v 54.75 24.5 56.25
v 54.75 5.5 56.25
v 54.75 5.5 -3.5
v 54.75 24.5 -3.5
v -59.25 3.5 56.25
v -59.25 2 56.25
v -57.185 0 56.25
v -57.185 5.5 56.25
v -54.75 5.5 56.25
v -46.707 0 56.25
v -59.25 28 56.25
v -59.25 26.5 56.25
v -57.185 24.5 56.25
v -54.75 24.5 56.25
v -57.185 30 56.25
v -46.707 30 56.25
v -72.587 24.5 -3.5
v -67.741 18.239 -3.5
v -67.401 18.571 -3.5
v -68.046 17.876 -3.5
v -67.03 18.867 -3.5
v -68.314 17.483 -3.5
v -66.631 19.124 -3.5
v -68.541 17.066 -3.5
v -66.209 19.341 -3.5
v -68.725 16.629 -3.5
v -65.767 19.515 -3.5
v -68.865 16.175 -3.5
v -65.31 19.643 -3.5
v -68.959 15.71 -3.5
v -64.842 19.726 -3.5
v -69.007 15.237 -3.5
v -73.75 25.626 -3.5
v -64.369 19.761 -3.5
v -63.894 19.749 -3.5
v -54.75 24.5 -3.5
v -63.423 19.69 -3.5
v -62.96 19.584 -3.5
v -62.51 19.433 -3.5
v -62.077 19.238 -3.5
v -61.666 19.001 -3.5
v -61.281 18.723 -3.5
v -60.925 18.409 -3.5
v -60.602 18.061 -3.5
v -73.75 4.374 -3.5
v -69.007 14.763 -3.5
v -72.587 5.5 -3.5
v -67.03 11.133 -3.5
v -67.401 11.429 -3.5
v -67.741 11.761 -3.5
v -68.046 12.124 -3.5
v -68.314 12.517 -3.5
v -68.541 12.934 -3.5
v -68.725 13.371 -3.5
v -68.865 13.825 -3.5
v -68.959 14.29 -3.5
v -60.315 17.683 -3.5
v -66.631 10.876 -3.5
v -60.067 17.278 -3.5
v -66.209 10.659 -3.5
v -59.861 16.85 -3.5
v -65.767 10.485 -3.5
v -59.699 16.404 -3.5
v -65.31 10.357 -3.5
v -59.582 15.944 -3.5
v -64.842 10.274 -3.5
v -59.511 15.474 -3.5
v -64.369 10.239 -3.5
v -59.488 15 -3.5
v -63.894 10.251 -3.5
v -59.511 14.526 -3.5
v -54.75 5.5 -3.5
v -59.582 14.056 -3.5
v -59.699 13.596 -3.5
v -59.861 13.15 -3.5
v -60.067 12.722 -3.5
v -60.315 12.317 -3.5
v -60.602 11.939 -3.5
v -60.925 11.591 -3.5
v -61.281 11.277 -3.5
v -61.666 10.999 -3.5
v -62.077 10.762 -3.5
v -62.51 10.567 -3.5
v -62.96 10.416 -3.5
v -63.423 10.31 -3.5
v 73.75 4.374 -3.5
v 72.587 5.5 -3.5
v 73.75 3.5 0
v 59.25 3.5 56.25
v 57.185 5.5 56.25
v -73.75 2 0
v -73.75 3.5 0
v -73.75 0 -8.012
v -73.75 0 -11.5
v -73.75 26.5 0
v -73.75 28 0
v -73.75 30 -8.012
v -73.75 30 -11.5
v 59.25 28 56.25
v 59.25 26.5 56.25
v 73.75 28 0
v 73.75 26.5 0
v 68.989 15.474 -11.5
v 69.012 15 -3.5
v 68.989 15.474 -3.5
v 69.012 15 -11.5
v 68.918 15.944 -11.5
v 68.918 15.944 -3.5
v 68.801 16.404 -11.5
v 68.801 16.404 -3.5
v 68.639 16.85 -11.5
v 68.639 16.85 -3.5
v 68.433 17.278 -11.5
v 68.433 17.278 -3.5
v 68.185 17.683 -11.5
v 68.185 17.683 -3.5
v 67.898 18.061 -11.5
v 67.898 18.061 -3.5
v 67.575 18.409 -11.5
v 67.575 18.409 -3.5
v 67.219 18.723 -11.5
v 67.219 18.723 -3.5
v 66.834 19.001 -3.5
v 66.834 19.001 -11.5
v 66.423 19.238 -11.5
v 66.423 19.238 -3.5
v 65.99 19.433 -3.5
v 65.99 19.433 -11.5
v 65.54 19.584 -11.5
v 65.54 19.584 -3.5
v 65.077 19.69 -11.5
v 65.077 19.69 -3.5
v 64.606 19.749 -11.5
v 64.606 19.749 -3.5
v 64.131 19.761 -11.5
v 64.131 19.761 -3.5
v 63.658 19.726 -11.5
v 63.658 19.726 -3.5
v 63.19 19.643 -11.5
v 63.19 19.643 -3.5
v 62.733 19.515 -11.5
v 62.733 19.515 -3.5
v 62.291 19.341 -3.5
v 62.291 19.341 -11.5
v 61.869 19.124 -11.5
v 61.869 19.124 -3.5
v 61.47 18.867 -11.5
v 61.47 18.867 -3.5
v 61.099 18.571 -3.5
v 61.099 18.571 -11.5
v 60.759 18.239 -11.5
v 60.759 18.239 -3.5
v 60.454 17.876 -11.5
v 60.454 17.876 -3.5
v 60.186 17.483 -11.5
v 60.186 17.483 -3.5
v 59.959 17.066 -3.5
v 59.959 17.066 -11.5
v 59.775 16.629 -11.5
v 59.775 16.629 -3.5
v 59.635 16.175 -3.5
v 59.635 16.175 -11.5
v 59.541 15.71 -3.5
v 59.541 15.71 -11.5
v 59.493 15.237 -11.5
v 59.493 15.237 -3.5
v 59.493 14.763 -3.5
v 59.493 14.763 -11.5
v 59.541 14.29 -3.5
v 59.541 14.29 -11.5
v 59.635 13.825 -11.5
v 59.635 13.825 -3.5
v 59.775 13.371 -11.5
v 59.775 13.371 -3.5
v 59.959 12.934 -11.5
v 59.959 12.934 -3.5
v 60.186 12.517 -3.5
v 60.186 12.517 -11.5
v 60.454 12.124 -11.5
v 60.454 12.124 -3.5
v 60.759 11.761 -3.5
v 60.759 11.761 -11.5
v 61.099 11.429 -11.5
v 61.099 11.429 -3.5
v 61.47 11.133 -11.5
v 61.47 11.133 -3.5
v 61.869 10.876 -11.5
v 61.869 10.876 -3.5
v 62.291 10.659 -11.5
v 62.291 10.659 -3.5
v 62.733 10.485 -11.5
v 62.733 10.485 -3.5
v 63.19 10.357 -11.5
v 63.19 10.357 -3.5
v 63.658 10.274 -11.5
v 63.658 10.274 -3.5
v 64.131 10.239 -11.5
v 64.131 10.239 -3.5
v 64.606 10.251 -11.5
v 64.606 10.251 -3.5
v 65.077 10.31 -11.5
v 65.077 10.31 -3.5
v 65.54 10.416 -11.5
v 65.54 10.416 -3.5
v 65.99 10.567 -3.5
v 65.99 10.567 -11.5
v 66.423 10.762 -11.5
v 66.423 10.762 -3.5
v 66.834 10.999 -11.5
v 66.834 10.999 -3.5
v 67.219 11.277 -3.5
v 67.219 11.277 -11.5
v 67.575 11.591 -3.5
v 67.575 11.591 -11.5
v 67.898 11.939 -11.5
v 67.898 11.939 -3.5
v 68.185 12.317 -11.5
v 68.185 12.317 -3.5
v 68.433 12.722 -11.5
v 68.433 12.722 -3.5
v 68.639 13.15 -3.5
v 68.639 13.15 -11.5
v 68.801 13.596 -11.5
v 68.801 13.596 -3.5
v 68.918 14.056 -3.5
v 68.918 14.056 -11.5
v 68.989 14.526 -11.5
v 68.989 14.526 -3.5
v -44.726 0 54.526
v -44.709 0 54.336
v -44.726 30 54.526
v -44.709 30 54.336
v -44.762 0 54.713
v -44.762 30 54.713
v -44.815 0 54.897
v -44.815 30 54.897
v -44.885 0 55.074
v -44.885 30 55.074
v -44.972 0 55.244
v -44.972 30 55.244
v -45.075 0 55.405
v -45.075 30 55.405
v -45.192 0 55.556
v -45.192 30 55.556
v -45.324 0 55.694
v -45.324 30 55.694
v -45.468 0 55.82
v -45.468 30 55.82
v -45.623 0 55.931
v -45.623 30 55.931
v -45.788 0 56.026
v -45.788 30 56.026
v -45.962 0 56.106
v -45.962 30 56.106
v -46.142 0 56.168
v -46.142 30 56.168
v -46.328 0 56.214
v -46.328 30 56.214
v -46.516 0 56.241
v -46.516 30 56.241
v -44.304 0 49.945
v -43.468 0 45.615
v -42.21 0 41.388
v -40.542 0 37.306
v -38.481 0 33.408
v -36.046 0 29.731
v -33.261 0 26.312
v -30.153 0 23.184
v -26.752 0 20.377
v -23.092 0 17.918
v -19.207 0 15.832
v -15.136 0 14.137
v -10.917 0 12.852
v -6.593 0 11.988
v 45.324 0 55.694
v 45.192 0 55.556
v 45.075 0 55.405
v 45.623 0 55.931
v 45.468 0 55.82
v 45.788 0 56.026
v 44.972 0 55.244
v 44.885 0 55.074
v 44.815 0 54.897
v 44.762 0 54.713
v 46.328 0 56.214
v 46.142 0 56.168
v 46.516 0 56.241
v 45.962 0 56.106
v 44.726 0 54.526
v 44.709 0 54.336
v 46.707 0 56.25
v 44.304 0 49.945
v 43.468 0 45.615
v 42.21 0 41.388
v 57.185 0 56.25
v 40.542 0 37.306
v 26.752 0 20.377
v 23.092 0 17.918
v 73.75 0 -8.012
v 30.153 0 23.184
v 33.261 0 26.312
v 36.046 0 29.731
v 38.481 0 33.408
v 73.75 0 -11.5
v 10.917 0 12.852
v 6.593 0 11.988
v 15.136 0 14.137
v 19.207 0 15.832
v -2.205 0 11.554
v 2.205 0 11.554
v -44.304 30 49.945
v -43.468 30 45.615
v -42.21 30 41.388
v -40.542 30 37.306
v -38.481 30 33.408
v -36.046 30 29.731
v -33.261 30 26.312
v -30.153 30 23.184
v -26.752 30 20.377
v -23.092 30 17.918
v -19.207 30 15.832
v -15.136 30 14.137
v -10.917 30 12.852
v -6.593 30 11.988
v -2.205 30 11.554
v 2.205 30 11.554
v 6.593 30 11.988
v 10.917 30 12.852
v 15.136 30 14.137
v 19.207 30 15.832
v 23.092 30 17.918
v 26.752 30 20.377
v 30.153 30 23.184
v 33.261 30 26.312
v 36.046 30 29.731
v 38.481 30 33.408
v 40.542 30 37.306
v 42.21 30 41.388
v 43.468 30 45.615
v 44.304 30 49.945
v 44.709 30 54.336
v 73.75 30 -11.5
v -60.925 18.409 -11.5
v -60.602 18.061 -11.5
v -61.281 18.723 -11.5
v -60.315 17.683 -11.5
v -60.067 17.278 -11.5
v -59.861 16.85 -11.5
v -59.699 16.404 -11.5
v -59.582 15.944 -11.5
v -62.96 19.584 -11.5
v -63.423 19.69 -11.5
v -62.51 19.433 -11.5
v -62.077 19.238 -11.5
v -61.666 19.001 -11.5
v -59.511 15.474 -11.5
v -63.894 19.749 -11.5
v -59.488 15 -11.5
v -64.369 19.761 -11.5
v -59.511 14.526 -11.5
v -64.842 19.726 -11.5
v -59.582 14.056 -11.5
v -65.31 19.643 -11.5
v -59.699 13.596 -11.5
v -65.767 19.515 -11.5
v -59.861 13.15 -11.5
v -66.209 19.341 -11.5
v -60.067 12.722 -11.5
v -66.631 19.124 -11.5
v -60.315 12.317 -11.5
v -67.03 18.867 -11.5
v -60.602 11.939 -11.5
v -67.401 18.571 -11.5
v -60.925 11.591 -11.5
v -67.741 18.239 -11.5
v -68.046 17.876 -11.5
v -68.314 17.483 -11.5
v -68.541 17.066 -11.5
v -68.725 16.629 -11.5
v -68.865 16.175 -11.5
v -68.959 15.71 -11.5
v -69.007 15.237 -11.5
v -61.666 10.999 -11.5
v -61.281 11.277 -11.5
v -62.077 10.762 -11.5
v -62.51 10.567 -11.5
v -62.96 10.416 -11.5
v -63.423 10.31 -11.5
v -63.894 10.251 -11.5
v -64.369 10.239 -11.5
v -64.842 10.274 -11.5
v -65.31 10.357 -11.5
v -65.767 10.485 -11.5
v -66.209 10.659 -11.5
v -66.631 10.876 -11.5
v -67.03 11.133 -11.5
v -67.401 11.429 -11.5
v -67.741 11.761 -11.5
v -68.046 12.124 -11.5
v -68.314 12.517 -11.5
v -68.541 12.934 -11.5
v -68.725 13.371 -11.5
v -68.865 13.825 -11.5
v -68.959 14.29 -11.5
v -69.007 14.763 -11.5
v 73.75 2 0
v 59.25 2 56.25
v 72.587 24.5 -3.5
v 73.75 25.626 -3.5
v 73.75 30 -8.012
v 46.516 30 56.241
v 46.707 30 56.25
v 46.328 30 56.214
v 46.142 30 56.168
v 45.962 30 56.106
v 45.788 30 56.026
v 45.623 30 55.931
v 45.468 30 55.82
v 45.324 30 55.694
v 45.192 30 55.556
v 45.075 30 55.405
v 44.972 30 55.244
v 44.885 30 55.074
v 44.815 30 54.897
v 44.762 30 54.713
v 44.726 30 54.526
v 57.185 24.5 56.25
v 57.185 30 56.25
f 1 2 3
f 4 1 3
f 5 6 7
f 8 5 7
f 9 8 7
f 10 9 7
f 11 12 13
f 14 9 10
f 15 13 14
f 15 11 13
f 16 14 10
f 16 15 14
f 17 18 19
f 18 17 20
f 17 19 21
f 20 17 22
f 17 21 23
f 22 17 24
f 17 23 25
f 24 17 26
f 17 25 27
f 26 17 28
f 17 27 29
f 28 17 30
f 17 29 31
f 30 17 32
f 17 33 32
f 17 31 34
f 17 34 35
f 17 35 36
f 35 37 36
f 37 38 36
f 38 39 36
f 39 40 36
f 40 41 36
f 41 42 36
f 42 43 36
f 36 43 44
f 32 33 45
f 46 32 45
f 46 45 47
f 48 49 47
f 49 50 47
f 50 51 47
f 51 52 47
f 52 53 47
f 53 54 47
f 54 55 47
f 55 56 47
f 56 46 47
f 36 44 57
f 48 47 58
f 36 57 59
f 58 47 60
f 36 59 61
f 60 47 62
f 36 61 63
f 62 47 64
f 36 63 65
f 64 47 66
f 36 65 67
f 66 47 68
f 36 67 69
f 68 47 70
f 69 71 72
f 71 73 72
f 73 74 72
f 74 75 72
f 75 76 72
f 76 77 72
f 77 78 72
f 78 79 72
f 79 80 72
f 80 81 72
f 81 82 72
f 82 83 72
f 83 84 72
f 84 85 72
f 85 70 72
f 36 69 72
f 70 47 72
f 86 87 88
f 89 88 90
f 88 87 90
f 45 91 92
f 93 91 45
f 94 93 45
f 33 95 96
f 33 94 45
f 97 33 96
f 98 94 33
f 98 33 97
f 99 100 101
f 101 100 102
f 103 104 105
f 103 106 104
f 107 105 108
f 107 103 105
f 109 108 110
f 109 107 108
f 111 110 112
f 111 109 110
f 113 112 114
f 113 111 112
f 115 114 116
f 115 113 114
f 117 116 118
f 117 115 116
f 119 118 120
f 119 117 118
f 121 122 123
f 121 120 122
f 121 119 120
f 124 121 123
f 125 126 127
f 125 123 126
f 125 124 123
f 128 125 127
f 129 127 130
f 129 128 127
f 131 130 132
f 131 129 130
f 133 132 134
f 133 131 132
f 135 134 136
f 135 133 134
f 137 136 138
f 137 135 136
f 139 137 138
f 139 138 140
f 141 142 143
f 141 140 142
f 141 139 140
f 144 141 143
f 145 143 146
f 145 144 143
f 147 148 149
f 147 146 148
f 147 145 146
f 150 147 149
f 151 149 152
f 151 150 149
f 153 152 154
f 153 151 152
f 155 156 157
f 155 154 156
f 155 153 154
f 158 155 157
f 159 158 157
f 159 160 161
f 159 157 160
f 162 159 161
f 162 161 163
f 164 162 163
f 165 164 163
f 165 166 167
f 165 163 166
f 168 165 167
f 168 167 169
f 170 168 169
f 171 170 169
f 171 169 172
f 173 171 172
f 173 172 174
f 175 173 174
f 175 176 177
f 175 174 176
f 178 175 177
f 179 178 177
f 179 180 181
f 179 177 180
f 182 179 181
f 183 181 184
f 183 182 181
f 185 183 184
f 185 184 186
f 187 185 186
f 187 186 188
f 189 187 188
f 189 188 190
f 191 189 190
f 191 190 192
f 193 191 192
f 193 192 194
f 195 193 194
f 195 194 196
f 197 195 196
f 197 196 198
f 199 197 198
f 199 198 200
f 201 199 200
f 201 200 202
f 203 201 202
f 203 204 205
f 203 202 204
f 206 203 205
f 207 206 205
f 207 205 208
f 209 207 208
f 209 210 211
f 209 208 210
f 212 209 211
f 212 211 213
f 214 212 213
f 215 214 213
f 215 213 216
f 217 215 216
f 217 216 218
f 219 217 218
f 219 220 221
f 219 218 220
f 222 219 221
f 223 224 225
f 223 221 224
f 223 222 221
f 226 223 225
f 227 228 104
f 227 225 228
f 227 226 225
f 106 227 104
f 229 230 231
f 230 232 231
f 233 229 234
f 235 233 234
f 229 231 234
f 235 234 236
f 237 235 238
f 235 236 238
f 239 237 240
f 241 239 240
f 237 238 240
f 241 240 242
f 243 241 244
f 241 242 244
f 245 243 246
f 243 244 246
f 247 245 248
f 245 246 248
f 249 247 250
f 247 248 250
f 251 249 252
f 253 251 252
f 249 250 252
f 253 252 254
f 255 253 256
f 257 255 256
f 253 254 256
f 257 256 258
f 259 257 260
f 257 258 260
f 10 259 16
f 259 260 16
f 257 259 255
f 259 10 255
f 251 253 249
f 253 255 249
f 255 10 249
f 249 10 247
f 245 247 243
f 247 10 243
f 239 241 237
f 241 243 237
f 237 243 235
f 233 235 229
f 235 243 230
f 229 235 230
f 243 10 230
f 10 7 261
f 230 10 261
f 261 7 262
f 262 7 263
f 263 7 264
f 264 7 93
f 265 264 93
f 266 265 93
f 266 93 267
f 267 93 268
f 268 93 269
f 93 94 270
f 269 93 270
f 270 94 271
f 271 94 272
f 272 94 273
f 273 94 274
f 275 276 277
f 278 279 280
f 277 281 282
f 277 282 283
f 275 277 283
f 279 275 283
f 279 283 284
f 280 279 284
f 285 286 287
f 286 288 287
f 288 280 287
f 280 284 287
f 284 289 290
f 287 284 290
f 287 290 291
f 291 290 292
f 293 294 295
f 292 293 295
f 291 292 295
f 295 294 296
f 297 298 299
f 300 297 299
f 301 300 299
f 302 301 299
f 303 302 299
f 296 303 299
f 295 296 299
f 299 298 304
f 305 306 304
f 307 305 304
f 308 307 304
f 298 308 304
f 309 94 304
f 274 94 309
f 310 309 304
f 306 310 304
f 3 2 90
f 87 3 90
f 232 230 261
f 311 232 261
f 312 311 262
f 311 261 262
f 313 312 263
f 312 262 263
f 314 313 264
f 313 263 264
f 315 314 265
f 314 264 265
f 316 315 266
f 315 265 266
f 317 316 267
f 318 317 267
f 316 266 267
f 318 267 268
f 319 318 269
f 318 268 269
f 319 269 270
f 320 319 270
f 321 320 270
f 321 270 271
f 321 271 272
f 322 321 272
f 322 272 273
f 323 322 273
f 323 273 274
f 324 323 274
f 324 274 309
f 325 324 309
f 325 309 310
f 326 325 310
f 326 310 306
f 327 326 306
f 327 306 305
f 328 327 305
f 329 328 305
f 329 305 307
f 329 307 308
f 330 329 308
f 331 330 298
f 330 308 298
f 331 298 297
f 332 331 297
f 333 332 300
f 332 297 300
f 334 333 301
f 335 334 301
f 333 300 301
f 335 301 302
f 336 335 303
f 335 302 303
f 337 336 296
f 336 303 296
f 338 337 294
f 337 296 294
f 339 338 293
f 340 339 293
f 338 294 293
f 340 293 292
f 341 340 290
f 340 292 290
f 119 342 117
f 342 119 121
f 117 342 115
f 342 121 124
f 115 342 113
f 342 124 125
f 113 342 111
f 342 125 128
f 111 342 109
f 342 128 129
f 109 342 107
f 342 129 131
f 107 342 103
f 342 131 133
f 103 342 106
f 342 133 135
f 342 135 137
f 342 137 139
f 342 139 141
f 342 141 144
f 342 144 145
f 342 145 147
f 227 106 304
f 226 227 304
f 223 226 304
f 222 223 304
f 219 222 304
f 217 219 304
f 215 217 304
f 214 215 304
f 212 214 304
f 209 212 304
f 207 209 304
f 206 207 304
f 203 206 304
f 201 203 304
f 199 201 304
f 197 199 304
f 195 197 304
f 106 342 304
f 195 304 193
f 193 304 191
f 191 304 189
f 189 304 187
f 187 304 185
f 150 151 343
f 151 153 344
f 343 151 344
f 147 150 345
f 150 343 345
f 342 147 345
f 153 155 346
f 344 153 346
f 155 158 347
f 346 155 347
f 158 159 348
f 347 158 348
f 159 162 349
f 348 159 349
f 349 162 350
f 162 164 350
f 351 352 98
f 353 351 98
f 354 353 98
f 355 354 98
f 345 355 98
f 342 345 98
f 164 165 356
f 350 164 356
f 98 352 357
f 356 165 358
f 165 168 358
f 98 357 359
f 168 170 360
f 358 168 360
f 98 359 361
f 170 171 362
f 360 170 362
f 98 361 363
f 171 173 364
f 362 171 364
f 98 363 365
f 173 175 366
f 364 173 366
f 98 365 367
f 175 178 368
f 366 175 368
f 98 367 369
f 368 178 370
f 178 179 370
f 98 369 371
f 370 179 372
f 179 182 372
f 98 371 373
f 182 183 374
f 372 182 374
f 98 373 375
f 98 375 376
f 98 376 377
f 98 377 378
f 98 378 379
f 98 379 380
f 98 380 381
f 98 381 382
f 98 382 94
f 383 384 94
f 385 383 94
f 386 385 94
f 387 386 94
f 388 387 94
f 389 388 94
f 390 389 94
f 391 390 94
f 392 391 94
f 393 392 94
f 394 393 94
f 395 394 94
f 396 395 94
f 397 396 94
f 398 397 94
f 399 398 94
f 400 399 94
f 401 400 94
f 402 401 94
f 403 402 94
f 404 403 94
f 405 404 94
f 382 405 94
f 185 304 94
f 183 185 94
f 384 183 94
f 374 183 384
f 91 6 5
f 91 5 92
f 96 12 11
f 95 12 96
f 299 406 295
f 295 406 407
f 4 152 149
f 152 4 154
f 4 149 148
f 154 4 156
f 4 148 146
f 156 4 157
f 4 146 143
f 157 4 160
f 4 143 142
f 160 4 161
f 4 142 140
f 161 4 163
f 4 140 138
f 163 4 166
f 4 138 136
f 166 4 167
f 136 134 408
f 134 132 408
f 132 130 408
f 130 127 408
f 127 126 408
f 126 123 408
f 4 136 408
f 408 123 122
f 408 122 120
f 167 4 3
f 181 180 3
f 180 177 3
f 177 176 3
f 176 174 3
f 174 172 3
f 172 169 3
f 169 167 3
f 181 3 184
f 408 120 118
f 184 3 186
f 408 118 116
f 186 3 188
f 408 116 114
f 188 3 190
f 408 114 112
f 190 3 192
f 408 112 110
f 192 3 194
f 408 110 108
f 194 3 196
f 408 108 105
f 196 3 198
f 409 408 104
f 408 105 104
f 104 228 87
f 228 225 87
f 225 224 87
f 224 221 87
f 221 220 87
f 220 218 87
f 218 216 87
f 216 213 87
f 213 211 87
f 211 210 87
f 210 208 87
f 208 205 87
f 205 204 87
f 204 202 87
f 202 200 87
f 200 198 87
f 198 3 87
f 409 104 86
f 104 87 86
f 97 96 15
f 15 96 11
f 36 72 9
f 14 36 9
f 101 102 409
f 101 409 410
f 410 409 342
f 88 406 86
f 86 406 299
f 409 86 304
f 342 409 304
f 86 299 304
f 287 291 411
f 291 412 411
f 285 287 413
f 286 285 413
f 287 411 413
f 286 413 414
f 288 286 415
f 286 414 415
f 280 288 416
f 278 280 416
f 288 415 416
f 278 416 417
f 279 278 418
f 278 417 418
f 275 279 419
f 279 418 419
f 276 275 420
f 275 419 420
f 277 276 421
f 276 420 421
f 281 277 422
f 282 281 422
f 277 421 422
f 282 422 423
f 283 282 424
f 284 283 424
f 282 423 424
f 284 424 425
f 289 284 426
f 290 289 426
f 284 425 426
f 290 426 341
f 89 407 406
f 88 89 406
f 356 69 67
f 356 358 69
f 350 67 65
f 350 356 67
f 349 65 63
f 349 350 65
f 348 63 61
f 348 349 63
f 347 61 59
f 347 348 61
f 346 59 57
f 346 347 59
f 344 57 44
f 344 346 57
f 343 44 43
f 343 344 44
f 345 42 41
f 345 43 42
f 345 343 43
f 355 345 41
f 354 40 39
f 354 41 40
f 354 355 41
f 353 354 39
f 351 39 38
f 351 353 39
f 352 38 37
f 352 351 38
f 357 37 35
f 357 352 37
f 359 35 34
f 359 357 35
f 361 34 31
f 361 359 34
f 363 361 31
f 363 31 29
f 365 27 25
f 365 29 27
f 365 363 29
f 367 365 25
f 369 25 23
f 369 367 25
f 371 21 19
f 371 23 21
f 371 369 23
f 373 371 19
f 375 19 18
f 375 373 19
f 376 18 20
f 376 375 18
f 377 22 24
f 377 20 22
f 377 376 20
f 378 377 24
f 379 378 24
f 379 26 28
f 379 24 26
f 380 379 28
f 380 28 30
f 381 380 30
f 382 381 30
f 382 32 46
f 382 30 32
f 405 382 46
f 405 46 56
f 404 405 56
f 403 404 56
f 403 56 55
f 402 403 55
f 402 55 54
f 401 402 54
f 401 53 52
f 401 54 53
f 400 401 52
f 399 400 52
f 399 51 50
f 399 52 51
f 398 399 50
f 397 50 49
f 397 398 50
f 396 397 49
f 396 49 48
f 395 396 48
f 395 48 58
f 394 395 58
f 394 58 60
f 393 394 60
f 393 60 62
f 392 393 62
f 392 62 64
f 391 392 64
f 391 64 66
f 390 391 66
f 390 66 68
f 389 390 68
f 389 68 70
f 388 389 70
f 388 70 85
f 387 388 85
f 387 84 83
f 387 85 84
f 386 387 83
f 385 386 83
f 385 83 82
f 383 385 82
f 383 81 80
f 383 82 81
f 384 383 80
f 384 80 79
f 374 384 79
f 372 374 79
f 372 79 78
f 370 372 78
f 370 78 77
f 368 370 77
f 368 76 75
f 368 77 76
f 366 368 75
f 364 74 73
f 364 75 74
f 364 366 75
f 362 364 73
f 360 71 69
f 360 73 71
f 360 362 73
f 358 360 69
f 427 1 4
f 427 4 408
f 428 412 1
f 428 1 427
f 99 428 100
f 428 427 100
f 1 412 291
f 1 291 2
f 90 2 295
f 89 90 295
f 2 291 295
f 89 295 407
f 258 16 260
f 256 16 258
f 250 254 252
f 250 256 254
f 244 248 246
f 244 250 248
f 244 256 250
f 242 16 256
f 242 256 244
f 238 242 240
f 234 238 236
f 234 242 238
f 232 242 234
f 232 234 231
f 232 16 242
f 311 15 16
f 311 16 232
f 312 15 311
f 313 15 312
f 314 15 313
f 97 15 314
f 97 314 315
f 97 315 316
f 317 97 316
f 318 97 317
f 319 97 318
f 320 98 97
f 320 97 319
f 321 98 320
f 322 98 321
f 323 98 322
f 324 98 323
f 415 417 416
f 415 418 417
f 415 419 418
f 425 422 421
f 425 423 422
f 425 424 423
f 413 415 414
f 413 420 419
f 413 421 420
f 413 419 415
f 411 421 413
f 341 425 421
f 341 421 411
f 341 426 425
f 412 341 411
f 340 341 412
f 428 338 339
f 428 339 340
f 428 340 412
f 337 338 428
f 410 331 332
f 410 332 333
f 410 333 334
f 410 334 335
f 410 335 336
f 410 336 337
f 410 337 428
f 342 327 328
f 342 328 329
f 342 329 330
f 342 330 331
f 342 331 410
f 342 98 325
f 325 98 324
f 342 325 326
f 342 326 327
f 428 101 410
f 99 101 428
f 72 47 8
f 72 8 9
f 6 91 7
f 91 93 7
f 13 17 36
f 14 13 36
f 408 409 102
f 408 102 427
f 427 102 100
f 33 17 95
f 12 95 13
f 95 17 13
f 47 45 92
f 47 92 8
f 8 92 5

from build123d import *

# Parameters (mm, degrees)
BOSS_EXTRUDE1_DEPTH     = 30
CUT_EXTRUDE2_DEPTH      = 100.544588
CUT_EXTRUDE2_DEPTH_BACK = 100.544588
SKETCH8_R               = 4.7625
SKETCH9_W               = 19
SKETCH9_H               = 5.5
BOSS_EXTRUDE3_DEPTH     = 59.75
CUT_EXTRUDE3_DEPTH      = 98.483973042
CUT_EXTRUDE3_DEPTH_BACK = 98.483973042
CHAMFER4_SIZE           = 2
FILLET2_R               = 2


with BuildPart() as part:
    # Sketch1 → Boss-Extrude1 (new body)
    with BuildSketch(Plane(origin=(0, 0, 0), x_dir=(1, 0, 0), z_dir=(0, 1, 0))):
        with BuildLine():
            Line((-54.75, -11.5), (-54.75, -56.25))
            Line((-54.75, -56.25), (-44.75, -56.25))
            ThreePointArc((-44.75, -56.25), (0, -11.5), (44.75, -56.25))
            Line((44.75, -56.25), (54.75, -56.25))
            Line((54.75, -56.25), (54.75, -11.5))
            Line((54.75, -11.5), (54.75, 3.5))
            Line((54.75, 3.5), (73.75, 3.5))
            Line((73.75, 3.5), (73.75, 11.5))
            Line((73.75, 11.5), (54.75, 11.5))
            Line((54.75, 11.5), (-54.75, 11.5))
            Line((-54.75, 11.5), (-73.75, 11.5))
            Line((-73.75, 11.5), (-73.75, 3.5))
            Line((-73.75, 3.5), (-54.75, 3.5))
            Line((-54.75, 3.5), (-54.75, -11.5))
        make_face()
    extrude(amount=BOSS_EXTRUDE1_DEPTH)

    # Sketch8 → Cut-Extrude2 (cut, two sides: drawn at the far end of the back side and taken through both)
    with BuildSketch(Plane.XY.offset(-3.5).offset(-CUT_EXTRUDE2_DEPTH_BACK)):
        with Locations((-64.25, 15)):
            Circle(SKETCH8_R)
        with Locations((64.25, 15)):
            Circle(SKETCH8_R)
    extrude(amount=CUT_EXTRUDE2_DEPTH + CUT_EXTRUDE2_DEPTH_BACK, mode=Mode.SUBTRACT)

    # Sketch9 → Boss-Extrude3 (add)
    with BuildSketch(Plane.XY.offset(-3.5)):
        with Locations((-64.25, 27.25)):
            Rectangle(SKETCH9_W, SKETCH9_H)
        with Locations((-64.25, 2.75)):
            Rectangle(SKETCH9_W, SKETCH9_H)
        with Locations((64.25, 27.25)):
            Rectangle(SKETCH9_W, SKETCH9_H)
        with Locations((64.25, 2.75)):
            Rectangle(SKETCH9_W, SKETCH9_H)
    extrude(amount=BOSS_EXTRUDE3_DEPTH)

    # Sketch10 → Cut-Extrude3 (cut, two sides: drawn at the far end of the back side and taken through both)
    with BuildSketch(Plane(origin=(0, 30, 0), x_dir=(1, 0, 0), z_dir=(0, 1, 0)).offset(-CUT_EXTRUDE3_DEPTH_BACK)):
        Polygon((-59.25, -56.25), (-73.75, 0), (-73.75, -56.25), align=None)
        Polygon((73.75, -56.25), (59.25, -56.25), (73.75, 0), align=None)
    extrude(amount=CUT_EXTRUDE3_DEPTH + CUT_EXTRUDE3_DEPTH_BACK, mode=Mode.SUBTRACT)

    # Chamfer4
    chamfer4_edges = [part.edges().sort_by_distance(p)[0] for p in [
        (-66.5, 24.5, 28.125),
    ]]
    chamfer(chamfer4_edges, length=CHAMFER4_SIZE)
    chamfer4_2_edges = [part.edges().sort_by_distance(p)[0] for p in [
        (-66.5, 5.5, 28.125),
    ]]
    chamfer(chamfer4_2_edges, length=CHAMFER4_SIZE)
    chamfer4_3_edges = [part.edges().sort_by_distance(p)[0] for p in [
        (-66.5, 0, 28.125),
    ]]
    chamfer(chamfer4_3_edges, length=CHAMFER4_SIZE)
    chamfer4_4_edges = [part.edges().sort_by_distance(p)[0] for p in [
        (66.5, 0, 28.125),
    ]]
    chamfer(chamfer4_4_edges, length=CHAMFER4_SIZE)
    chamfer4_5_edges = [part.edges().sort_by_distance(p)[0] for p in [
        (-66.5, 30, 28.125),
    ]]
    chamfer(chamfer4_5_edges, length=CHAMFER4_SIZE)
    chamfer4_6_edges = [part.edges().sort_by_distance(p)[0] for p in [
        (66.5, 30, 28.125),
    ]]
    chamfer(chamfer4_6_edges, length=CHAMFER4_SIZE)
    chamfer4_7_edges = [part.edges().sort_by_distance(p)[0] for p in [
        (66.5, 5.5, 28.125),
    ]]
    chamfer(chamfer4_7_edges, length=CHAMFER4_SIZE)
    chamfer4_8_edges = [part.edges().sort_by_distance(p)[0] for p in [
        (66.5, 24.5, 28.125),
    ]]
    chamfer(chamfer4_8_edges, length=CHAMFER4_SIZE)

    # Fillet2
    fillet2_edges = [part.edges().sort_by_distance(p)[0] for p in [
        (44.75, 15, 56.25),
        (-44.75, 15, 56.25),
    ]]
    fillet(fillet2_edges, radius=FILLET2_R)


solid = part.part
